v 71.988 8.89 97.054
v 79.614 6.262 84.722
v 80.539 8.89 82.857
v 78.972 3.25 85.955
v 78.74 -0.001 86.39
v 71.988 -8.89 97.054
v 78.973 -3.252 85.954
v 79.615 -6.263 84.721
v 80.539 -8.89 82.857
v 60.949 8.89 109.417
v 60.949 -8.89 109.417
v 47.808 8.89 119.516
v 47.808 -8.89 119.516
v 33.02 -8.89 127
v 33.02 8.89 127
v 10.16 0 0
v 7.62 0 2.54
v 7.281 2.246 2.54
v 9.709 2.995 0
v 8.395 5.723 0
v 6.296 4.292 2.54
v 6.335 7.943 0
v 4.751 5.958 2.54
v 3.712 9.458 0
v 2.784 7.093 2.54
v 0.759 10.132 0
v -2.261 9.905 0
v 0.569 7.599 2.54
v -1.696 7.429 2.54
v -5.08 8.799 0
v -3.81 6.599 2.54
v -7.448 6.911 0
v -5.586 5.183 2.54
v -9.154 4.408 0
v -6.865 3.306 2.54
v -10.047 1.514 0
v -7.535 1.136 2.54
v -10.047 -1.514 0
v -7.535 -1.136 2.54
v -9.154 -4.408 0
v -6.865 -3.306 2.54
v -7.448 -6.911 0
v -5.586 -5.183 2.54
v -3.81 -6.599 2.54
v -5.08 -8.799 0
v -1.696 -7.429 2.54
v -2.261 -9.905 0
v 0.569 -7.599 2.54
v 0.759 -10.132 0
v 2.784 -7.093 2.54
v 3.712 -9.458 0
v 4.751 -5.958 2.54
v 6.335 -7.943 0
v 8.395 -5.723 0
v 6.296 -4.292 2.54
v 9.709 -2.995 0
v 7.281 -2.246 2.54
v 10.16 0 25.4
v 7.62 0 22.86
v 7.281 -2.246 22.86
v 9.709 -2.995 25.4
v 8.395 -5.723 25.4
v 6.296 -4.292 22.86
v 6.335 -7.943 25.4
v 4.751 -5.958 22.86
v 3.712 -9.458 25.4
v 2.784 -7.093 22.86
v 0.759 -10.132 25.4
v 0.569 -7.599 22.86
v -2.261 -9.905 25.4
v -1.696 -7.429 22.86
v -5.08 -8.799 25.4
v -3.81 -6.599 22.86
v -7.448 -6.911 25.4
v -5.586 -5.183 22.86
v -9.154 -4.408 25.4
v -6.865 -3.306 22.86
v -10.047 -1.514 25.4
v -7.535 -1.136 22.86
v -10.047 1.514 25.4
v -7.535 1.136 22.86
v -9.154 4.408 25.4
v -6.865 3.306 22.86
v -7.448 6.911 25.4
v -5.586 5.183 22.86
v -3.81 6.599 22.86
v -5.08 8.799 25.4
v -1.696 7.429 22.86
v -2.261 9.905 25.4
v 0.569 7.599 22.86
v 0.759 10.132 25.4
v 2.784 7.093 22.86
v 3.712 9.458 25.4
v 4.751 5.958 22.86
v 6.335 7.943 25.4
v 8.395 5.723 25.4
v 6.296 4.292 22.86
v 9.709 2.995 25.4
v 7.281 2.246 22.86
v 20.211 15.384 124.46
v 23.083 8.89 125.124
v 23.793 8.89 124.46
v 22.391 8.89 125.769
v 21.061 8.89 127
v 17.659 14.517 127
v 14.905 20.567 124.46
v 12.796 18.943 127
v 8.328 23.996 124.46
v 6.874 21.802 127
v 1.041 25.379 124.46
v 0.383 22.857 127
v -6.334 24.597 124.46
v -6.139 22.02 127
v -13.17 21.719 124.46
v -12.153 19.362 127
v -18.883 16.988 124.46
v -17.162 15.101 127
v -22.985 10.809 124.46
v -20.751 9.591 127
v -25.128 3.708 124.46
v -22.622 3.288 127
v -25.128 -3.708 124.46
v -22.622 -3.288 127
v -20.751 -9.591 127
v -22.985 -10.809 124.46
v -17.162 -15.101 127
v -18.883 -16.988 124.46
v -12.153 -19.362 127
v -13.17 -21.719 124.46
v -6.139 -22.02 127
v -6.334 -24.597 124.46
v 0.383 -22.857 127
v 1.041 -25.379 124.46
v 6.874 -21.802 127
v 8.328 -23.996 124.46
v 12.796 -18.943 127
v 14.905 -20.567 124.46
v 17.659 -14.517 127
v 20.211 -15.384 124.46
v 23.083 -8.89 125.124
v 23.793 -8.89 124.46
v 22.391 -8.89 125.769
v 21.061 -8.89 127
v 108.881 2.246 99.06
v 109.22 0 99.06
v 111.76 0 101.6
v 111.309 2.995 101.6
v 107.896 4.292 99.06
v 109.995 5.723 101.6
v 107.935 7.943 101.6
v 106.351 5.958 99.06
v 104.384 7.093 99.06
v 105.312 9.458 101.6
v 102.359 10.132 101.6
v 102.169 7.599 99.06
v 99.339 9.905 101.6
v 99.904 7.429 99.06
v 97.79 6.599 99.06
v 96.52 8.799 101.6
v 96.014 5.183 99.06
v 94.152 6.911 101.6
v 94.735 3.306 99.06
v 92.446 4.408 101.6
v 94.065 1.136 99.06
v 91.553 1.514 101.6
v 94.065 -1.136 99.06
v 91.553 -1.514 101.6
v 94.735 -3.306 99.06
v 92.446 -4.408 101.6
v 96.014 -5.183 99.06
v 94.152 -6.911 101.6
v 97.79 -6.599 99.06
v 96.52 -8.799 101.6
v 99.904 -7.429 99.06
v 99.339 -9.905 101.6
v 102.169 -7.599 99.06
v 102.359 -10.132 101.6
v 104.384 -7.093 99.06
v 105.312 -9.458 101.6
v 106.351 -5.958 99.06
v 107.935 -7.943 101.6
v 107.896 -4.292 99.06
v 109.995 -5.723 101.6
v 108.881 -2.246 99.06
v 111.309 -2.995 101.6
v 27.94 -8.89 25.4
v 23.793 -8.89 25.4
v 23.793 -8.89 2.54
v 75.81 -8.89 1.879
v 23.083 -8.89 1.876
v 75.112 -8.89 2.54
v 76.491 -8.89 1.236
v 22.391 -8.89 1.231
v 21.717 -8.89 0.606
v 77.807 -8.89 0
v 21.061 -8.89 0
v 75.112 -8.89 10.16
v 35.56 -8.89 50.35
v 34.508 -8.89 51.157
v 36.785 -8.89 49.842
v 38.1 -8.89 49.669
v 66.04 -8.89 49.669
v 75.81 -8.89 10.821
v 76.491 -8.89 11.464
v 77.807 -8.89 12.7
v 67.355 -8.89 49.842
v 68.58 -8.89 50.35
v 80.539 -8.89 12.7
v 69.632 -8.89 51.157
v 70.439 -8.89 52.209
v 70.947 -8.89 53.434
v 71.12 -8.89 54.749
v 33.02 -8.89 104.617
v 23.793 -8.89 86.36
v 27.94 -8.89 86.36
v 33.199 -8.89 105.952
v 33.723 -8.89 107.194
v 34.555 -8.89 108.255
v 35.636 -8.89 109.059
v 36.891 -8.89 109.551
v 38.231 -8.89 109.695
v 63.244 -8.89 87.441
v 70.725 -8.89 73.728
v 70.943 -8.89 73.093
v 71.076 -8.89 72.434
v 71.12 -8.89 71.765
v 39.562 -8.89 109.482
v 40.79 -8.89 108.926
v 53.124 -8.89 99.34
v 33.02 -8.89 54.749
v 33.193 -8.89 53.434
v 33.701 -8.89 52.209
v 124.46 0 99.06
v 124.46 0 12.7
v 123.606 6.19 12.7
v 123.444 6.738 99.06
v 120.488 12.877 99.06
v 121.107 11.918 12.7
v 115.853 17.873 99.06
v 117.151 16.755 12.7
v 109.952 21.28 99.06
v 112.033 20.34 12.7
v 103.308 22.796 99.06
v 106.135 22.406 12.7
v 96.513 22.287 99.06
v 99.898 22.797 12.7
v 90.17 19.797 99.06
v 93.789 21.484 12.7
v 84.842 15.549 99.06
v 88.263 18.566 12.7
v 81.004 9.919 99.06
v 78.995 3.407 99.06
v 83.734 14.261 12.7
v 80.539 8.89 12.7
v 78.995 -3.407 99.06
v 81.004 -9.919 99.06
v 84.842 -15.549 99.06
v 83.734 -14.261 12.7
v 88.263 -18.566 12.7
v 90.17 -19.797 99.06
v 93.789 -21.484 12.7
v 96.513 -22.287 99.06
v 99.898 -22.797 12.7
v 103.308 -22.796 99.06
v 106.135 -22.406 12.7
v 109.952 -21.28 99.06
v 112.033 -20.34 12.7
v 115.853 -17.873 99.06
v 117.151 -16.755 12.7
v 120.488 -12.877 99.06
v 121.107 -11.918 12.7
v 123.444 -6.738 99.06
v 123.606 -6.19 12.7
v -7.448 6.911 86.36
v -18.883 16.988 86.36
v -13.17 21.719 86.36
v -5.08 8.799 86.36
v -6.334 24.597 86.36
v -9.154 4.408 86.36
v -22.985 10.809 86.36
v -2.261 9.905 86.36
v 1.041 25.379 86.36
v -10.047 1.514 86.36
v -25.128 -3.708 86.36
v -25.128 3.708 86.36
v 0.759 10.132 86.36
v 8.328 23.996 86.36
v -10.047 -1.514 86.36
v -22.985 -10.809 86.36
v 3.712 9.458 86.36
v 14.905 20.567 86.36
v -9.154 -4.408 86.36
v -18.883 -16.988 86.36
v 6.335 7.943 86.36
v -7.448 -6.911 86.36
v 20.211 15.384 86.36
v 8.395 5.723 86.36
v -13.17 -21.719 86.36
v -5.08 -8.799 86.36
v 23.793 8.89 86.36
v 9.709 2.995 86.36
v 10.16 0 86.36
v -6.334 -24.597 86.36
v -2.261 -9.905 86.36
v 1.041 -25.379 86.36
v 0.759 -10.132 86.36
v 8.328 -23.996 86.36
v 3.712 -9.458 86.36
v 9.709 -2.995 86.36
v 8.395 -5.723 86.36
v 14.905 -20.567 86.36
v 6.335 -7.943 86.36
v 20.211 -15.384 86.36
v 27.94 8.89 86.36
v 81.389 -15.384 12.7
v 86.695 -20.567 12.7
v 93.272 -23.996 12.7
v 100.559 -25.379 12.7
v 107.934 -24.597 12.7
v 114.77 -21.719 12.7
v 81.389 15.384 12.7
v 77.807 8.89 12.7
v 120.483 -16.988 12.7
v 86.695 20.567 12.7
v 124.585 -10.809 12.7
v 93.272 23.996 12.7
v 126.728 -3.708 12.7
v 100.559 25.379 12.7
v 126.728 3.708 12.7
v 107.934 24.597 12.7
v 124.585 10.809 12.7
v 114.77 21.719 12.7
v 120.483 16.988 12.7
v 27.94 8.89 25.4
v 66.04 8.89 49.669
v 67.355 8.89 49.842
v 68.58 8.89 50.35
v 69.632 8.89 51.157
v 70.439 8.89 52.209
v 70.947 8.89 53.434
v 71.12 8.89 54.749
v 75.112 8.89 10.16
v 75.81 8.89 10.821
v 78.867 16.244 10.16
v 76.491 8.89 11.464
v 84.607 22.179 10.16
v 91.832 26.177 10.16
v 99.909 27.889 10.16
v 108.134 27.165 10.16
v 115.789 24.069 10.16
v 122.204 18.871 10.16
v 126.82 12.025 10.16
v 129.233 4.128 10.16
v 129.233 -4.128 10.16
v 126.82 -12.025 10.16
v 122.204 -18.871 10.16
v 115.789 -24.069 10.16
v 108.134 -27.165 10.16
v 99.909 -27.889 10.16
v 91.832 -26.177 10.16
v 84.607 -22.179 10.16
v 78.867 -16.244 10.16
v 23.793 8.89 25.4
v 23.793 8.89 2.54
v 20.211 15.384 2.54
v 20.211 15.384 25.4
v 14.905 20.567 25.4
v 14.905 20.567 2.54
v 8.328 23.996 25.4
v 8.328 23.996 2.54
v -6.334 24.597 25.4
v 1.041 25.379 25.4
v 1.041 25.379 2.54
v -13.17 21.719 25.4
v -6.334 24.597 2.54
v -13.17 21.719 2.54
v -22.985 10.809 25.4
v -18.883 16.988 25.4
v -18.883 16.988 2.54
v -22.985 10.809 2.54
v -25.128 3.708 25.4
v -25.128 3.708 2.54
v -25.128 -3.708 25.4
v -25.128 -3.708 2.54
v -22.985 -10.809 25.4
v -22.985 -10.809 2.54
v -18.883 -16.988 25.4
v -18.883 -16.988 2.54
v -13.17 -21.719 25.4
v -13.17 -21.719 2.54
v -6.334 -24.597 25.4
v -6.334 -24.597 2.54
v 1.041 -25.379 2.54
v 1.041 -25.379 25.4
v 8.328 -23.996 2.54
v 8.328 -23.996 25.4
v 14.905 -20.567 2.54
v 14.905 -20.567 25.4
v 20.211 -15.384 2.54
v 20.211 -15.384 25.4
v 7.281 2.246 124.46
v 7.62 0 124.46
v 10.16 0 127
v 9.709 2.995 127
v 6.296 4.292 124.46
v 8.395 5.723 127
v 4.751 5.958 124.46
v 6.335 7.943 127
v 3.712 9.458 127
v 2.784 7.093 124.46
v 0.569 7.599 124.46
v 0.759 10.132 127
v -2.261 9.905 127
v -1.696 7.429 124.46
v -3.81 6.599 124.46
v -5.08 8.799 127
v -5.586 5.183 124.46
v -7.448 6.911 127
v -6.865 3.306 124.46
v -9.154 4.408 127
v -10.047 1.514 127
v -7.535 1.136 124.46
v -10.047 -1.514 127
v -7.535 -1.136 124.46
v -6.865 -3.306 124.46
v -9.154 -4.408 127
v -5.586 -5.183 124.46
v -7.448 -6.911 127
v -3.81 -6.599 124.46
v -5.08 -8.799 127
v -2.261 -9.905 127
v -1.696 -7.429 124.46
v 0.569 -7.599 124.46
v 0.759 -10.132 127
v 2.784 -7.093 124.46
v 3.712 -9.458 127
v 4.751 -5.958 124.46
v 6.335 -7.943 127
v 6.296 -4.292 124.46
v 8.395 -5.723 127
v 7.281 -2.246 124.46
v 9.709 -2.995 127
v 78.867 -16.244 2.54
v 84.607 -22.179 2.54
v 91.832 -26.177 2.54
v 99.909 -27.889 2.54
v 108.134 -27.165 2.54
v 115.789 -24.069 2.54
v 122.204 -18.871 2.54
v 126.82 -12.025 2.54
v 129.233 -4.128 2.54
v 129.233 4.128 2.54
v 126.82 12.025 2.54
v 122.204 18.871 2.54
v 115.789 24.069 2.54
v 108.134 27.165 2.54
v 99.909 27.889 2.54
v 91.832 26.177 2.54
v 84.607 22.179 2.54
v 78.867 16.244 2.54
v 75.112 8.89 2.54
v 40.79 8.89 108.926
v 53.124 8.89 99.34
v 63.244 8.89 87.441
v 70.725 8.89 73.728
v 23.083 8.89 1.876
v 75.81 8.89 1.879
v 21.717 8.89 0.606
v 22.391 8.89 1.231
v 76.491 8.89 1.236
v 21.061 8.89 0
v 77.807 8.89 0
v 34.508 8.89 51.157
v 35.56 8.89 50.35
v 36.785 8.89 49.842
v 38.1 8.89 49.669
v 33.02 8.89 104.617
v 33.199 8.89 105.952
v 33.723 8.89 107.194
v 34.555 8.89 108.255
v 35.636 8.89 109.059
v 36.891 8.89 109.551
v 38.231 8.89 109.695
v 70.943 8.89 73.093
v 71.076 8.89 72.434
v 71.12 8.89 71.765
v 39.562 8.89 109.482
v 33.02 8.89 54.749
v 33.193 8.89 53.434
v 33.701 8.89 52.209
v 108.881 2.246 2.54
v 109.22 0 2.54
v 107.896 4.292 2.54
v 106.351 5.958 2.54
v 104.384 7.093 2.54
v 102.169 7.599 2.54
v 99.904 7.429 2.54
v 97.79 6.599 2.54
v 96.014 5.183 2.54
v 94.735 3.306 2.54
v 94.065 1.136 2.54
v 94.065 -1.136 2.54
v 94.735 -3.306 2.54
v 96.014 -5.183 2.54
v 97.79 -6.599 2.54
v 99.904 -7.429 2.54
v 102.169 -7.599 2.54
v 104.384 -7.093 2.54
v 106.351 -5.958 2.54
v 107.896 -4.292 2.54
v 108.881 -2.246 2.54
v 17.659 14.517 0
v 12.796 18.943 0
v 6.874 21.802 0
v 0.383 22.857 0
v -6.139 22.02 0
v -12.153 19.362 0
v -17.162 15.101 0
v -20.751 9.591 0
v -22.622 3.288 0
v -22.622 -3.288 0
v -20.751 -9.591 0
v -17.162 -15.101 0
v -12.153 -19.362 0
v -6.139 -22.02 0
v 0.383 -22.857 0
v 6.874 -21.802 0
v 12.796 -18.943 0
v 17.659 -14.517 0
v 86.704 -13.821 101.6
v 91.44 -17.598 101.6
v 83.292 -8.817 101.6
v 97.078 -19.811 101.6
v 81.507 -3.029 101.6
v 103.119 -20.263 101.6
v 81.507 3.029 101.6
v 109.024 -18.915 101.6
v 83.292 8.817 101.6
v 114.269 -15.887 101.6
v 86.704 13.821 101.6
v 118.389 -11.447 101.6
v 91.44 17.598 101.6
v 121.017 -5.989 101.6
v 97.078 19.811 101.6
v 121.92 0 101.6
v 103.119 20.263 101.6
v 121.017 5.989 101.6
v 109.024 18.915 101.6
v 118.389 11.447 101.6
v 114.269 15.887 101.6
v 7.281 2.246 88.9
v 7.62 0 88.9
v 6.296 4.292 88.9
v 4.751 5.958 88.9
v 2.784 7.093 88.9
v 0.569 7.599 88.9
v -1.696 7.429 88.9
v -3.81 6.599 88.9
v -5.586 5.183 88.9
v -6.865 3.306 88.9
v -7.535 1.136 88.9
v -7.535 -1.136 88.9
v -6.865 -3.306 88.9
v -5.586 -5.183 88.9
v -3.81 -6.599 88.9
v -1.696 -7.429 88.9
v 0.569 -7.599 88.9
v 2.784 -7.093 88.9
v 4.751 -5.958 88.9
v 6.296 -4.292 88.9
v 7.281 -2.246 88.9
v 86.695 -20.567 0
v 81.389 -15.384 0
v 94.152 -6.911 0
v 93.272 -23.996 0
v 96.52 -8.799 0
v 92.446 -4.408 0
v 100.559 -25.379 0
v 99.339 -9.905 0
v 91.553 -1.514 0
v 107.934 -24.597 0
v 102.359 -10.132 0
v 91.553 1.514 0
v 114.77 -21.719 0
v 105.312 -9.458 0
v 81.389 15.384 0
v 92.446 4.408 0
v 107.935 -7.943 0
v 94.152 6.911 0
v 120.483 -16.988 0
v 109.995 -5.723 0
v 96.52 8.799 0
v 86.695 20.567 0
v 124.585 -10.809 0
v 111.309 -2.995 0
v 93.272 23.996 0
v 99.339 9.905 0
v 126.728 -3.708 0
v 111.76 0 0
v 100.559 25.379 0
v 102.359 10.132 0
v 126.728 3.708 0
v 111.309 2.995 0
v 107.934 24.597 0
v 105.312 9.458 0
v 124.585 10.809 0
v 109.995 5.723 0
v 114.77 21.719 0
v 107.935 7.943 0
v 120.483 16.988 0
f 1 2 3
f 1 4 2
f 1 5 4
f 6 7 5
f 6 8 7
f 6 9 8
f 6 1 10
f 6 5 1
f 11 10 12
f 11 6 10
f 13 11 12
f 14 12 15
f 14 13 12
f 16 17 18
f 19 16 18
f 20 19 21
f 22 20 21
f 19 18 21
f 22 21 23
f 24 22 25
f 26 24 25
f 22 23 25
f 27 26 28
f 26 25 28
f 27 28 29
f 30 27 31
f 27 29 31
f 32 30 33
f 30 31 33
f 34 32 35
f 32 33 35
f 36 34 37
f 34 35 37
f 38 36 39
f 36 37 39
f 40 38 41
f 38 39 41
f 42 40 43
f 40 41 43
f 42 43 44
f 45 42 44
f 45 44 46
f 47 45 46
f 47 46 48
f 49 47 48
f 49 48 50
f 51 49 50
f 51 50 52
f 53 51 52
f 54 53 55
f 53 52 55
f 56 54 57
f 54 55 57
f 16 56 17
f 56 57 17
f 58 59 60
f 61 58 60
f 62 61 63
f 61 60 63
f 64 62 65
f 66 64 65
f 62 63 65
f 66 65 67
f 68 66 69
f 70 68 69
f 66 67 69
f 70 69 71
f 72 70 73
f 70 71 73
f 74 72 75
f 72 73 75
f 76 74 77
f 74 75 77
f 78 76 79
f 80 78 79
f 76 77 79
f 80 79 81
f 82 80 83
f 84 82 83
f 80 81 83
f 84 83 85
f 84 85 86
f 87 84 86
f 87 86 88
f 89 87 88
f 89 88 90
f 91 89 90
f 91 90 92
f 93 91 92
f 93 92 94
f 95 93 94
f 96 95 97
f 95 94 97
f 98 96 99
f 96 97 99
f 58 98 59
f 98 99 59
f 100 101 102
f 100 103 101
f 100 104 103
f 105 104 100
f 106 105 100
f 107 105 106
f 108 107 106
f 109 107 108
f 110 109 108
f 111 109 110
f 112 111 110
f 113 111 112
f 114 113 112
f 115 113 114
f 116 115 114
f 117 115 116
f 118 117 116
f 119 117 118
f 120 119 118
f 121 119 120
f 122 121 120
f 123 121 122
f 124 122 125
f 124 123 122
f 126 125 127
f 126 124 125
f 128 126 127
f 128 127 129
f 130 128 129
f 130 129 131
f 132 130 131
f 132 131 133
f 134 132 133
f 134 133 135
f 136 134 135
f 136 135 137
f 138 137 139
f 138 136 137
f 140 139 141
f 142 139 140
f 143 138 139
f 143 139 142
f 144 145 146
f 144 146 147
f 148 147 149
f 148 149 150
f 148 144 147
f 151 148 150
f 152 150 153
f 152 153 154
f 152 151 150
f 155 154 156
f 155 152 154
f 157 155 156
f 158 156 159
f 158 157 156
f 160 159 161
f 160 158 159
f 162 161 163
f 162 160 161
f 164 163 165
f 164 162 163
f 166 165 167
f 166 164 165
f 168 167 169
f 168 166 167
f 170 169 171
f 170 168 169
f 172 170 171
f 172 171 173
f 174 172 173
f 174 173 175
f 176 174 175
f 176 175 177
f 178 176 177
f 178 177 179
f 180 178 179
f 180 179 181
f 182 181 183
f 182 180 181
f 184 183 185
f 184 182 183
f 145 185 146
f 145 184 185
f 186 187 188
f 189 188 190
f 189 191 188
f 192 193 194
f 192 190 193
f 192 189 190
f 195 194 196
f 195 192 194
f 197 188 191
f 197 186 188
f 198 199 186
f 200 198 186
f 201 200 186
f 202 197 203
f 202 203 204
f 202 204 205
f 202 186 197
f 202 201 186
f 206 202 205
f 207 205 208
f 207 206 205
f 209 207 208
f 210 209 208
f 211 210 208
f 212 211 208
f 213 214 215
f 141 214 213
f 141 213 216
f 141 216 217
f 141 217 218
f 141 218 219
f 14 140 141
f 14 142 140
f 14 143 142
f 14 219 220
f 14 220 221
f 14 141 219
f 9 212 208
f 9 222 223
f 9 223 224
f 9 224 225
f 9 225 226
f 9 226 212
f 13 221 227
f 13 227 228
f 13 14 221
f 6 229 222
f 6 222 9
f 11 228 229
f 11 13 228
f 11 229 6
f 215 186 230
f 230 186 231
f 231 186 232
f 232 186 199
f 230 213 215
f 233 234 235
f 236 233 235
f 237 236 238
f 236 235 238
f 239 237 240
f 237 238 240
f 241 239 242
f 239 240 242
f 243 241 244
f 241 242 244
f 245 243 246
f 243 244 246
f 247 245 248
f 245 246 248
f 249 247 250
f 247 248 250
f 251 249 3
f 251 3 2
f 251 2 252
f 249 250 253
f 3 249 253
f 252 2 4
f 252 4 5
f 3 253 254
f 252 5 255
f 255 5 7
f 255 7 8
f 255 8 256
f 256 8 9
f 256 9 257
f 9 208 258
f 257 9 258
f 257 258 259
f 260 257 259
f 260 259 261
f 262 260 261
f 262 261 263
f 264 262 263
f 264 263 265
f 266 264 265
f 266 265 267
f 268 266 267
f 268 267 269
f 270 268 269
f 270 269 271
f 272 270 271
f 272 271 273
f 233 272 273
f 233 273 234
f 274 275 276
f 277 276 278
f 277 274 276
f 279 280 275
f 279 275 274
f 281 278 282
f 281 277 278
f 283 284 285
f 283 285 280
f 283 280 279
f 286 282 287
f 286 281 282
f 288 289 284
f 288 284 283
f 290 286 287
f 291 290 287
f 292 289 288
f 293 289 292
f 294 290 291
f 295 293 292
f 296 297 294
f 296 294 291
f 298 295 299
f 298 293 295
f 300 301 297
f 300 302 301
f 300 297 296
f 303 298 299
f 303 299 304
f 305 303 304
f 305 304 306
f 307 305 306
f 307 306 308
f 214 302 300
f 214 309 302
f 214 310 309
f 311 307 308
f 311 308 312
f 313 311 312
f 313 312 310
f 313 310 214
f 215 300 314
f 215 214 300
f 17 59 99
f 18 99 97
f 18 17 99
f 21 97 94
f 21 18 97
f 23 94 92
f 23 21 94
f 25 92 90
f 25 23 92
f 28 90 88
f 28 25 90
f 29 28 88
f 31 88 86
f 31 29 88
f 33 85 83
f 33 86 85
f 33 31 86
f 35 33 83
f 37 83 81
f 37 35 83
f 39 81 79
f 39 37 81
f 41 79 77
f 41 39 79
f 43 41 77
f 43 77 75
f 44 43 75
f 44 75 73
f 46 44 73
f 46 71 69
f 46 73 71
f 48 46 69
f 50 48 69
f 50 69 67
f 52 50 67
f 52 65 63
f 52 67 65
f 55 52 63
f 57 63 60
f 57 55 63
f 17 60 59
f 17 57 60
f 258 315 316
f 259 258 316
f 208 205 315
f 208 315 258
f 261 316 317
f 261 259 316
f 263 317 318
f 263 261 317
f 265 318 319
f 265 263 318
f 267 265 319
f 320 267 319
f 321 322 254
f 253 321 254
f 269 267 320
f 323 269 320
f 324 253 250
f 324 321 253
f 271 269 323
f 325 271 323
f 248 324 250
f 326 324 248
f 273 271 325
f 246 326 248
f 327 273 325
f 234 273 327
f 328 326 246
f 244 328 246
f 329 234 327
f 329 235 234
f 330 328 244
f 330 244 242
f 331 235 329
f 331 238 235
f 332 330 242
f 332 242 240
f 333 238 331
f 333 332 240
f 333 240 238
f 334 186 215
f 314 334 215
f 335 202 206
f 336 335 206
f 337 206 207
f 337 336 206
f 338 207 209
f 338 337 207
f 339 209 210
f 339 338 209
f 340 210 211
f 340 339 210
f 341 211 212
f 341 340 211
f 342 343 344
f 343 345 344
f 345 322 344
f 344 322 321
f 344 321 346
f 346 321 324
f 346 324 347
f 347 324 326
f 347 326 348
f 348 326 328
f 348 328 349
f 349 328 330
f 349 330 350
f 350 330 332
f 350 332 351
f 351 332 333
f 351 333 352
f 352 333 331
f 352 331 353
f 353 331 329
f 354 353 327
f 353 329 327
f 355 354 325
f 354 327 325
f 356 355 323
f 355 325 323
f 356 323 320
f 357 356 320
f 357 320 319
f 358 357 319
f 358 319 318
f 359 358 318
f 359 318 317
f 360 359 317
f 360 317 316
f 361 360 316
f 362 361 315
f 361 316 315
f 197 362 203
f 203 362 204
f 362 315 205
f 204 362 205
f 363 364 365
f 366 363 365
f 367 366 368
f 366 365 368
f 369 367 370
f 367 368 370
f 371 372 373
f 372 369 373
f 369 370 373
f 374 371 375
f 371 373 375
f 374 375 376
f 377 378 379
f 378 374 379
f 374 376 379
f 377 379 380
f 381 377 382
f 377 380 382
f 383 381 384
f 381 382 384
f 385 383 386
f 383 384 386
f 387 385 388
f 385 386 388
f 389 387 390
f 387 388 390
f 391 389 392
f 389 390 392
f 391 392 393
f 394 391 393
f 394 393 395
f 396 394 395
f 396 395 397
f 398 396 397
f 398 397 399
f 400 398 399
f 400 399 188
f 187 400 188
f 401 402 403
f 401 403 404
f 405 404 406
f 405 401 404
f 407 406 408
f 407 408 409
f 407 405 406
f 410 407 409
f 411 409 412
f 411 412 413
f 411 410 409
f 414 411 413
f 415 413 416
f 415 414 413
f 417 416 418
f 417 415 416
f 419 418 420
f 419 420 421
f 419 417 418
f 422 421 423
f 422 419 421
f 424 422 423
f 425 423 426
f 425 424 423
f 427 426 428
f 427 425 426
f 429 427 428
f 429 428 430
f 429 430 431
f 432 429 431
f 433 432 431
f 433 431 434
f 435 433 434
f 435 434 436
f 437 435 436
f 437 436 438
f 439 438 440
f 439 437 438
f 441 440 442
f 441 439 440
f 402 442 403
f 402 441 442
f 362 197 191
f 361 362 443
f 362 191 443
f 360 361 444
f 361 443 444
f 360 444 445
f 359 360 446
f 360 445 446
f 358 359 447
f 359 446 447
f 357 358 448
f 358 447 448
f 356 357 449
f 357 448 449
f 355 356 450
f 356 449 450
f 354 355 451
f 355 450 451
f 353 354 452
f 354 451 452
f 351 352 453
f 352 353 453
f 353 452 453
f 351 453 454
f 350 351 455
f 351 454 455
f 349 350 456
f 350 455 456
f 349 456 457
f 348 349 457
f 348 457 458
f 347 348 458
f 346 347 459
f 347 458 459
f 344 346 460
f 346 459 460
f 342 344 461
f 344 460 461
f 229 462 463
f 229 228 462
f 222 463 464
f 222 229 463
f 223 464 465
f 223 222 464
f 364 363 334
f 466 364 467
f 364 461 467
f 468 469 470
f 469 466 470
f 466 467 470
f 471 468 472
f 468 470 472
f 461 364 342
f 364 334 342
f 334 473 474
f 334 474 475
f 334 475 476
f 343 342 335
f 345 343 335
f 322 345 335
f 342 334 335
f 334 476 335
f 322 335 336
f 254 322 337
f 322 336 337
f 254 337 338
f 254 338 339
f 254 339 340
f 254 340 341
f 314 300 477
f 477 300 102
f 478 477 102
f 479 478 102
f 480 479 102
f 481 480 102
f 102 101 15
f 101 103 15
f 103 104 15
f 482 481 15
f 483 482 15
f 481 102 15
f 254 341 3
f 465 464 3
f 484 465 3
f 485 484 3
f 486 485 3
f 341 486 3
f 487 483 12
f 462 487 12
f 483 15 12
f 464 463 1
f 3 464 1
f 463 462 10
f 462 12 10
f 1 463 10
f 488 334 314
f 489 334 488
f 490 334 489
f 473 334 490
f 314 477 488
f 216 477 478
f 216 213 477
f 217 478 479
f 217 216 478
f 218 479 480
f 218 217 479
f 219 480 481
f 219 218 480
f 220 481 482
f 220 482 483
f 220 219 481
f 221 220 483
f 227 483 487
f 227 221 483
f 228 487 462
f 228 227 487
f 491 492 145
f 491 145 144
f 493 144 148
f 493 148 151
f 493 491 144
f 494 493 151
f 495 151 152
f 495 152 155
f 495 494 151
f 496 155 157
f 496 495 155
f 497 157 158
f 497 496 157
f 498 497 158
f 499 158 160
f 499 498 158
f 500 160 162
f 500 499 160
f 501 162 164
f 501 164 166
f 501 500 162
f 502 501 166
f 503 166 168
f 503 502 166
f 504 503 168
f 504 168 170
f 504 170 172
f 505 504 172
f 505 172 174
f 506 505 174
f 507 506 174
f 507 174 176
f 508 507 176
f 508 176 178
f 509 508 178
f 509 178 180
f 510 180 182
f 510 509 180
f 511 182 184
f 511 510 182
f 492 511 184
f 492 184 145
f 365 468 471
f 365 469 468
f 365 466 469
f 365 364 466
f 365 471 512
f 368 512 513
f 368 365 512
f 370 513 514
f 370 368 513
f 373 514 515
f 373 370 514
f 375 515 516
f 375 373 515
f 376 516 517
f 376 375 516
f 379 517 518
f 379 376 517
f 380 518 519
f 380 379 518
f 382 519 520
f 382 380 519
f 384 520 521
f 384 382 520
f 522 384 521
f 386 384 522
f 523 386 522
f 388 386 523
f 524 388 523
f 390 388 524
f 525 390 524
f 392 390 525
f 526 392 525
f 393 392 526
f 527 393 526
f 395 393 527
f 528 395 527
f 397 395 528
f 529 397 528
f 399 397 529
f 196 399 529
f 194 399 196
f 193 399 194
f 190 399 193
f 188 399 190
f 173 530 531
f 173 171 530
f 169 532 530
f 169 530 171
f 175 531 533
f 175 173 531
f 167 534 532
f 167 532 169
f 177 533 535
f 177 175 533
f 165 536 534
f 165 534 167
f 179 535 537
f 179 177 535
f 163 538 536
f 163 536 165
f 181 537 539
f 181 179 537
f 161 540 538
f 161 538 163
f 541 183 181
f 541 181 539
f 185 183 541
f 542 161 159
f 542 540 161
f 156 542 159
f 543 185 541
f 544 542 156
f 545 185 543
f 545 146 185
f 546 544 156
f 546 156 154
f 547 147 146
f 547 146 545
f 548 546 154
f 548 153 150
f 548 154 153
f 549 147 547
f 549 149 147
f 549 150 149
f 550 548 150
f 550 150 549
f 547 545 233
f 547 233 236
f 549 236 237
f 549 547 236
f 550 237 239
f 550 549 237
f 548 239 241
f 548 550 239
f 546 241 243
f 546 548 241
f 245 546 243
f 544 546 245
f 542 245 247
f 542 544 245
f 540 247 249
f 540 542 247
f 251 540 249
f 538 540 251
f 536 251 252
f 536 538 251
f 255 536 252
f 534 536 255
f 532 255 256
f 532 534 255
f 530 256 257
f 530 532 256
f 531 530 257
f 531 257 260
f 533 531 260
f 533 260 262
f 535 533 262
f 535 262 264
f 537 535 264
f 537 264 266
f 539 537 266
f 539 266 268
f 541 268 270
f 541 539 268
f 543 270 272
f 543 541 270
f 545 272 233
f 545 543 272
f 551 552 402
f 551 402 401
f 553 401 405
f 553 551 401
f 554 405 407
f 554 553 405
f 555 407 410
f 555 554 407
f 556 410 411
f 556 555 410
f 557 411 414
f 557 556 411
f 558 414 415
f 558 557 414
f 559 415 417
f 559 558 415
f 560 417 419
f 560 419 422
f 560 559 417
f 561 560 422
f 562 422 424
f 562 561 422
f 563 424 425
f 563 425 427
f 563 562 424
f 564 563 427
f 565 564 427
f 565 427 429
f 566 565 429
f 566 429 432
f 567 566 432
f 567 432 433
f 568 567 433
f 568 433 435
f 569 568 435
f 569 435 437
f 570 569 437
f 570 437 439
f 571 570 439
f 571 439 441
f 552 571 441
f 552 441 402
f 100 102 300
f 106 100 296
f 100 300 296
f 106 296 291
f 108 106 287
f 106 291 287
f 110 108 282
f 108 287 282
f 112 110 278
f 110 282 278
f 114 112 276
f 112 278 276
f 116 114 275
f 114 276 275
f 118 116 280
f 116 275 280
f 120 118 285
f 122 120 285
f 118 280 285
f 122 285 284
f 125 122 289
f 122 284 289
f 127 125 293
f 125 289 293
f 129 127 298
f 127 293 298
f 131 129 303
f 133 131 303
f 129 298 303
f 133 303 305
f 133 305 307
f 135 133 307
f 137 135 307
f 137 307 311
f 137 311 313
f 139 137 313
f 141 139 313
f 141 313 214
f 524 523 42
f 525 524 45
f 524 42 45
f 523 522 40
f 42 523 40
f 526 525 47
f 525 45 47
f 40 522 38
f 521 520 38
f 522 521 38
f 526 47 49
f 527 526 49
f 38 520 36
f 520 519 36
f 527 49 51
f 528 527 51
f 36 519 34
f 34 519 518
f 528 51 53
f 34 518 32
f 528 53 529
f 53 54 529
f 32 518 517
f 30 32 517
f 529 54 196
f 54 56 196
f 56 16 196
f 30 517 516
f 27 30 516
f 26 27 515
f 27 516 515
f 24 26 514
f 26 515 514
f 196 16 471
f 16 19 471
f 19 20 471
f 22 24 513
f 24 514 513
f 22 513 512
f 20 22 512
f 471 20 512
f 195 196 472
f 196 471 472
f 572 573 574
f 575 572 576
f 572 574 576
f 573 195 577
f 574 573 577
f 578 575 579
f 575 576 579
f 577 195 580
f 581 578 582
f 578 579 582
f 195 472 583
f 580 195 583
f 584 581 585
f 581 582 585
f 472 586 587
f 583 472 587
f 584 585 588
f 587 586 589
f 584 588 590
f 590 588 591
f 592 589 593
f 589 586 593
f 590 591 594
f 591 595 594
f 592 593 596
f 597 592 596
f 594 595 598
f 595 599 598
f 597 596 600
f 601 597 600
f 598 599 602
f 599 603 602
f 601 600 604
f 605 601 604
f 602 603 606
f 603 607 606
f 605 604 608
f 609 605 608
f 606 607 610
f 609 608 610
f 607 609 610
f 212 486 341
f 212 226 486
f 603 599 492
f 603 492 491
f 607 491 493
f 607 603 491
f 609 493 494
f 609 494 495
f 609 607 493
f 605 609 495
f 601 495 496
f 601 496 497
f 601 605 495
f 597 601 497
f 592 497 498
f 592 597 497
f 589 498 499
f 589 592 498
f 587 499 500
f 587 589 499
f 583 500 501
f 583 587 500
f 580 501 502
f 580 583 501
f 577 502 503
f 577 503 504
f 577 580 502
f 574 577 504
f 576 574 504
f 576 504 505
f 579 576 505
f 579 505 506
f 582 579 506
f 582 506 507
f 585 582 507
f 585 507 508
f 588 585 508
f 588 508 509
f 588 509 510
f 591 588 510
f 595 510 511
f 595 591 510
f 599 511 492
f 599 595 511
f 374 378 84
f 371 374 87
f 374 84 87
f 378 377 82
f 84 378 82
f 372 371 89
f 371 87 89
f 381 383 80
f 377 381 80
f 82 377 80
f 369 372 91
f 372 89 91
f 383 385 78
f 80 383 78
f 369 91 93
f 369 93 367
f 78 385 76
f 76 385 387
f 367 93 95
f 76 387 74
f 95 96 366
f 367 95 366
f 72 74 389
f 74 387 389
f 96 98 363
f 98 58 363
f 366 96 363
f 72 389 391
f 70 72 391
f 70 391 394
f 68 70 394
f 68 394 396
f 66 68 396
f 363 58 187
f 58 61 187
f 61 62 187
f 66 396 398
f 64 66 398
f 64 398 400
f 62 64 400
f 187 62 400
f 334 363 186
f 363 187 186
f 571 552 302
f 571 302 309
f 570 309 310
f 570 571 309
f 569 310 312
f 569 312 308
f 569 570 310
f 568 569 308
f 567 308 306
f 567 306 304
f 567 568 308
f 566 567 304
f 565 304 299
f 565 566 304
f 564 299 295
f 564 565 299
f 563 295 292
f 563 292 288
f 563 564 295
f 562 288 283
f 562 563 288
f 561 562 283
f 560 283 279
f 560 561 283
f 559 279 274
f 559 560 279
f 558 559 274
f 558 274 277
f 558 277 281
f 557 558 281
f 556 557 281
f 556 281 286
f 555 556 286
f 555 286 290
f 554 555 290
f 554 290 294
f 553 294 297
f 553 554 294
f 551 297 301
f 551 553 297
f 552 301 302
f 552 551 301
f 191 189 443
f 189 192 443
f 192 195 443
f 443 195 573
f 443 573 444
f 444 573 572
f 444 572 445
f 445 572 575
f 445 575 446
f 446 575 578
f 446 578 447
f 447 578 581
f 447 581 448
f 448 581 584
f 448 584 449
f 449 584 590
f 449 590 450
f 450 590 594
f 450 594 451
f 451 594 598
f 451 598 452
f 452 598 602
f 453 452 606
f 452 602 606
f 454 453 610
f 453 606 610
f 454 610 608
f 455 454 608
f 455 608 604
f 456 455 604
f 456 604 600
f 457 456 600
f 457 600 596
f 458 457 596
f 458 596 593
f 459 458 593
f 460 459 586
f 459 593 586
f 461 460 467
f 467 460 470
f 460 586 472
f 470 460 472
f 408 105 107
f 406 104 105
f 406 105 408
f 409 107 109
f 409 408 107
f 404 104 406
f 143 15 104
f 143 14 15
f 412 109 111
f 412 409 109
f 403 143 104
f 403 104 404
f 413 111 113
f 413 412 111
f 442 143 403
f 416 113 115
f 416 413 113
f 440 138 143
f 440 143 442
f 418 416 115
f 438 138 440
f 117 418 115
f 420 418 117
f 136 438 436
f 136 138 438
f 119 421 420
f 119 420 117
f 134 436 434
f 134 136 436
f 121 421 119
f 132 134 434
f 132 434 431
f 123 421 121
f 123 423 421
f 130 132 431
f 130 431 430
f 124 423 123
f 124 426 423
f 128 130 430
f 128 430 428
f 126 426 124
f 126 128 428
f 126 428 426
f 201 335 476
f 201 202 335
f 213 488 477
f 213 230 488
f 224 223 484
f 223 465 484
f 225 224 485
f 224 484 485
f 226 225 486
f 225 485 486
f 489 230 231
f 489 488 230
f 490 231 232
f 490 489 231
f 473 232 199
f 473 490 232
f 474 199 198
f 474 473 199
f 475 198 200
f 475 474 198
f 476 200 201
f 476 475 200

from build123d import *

# Parameters (mm, degrees)
F0_R      = 25.4
F0_R_2    = 7.62
F1_DEPTH  = 127
F0_R_3    = 22.86
F2_DEPTH  = 101.6
F4_DEPTH  = 8.89
F5_W      = 60.96
F5_H      = 60.96
F6_DEPTH  = 50.8
F7_R      = 5.08
F8_SIZE   = 2.54
F9_R      = 27.94
F9_R_2    = 22.86
F10_DEPTH = 12.7
F11_SIZE  = 2.54


with BuildPart() as f1:
    # F0 (on Top) → F1 (new body)
    with BuildSketch(Plane.XY):
        Circle(F0_R)
        Circle(F0_R_2, mode=Mode.SUBTRACT)
    extrude(amount=F1_DEPTH)



with BuildPart() as f2:
    # F0 (on Top) → F2 (new body)
    with BuildSketch(Plane.XY):
        with Locations((101.6, 0)):
            Circle(F0_R_3)
        with Locations((101.6, 0)):
            Circle(F0_R_2, mode=Mode.SUBTRACT)
    extrude(amount=F2_DEPTH)


with BuildPart() as f1_1:
    add(f1.part)

    add(f2.part)  # F4 merges F2
    # F3 (on Front) → F4 (join, symmetric)
    with BuildSketch(Plane.XZ):
        with BuildLine():
            Line((20.32, 127), (20.32, 0))
            Line((20.32, 0), (81.28, 0))
            Line((81.28, 0), (81.28, 81.28))
            ThreePointArc((81.28, 81.28), (61.5844056789, 108.82076155), (33.02, 127))
            Line((33.02, 127), (20.32, 127))
        make_face()
        with BuildLine():
            ThreePointArc((33.02, 113.1692568198), (55.8815349001, 96.5627163287), (71.12, 72.7674195988))
            Line((71.12, 72.7674195988), (71.12, 49.6692568198))
            Line((71.12, 49.6692568198), (33.02, 49.6692568198))
            Line((33.02, 49.6692568198), (33.02, 113.1692568198))
        make_face(mode=Mode.SUBTRACT)
    extrude(amount=F4_DEPTH, both=True)

    # F5 (on Front) → F6 (cut, symmetric)
    with BuildSketch(Plane.XZ):
        with Locations((-2.54, 55.88)):
            Rectangle(F5_W, F5_H)
    extrude(amount=F6_DEPTH, both=True, mode=Mode.SUBTRACT)

    # F7
    f7_edges = [f1_1.edges().sort_by_distance(p)[0] for p in [
        (33.02, 0, 113.169257),
        (33.02, 0, 49.669257),
        (71.12, 0, 49.669257),
        (71.12, 0, 72.76742),
    ]]
    fillet(f7_edges, radius=F7_R)

    # F8
    f8_edges = [f1_1.edges().sort_by_distance(p)[0] for p in [
        (-25.4, 0, 127),
        (-7.62, 0, 127),
        (-7.62, 0, 25.4),
        (-25.4, 0, 0),
        (-7.62, 0, 86.36),
        (-7.62, 0, 0),
    ]]
    chamfer(f8_edges, length=F8_SIZE)

    # F9 (on Top) → F10 (join)
    with BuildSketch(Plane.XY):
        with Locations((101.6, 0)):
            Circle(F9_R)
        with Locations((101.6, 0)):
            Circle(F9_R_2, mode=Mode.SUBTRACT)
    extrude(amount=F10_DEPTH)

    # F11
    f11_edges = [f1_1.edges().sort_by_distance(p)[0] for p in [
        (93.98, 0, 0),
        (129.54, 0, 0),
        (93.98, 0, 101.6),
        (129.54, 0, 12.7),
        (78.74, 0, 101.6),
    ]]
    chamfer(f11_edges, length=F11_SIZE)


solid = f1_1.part
